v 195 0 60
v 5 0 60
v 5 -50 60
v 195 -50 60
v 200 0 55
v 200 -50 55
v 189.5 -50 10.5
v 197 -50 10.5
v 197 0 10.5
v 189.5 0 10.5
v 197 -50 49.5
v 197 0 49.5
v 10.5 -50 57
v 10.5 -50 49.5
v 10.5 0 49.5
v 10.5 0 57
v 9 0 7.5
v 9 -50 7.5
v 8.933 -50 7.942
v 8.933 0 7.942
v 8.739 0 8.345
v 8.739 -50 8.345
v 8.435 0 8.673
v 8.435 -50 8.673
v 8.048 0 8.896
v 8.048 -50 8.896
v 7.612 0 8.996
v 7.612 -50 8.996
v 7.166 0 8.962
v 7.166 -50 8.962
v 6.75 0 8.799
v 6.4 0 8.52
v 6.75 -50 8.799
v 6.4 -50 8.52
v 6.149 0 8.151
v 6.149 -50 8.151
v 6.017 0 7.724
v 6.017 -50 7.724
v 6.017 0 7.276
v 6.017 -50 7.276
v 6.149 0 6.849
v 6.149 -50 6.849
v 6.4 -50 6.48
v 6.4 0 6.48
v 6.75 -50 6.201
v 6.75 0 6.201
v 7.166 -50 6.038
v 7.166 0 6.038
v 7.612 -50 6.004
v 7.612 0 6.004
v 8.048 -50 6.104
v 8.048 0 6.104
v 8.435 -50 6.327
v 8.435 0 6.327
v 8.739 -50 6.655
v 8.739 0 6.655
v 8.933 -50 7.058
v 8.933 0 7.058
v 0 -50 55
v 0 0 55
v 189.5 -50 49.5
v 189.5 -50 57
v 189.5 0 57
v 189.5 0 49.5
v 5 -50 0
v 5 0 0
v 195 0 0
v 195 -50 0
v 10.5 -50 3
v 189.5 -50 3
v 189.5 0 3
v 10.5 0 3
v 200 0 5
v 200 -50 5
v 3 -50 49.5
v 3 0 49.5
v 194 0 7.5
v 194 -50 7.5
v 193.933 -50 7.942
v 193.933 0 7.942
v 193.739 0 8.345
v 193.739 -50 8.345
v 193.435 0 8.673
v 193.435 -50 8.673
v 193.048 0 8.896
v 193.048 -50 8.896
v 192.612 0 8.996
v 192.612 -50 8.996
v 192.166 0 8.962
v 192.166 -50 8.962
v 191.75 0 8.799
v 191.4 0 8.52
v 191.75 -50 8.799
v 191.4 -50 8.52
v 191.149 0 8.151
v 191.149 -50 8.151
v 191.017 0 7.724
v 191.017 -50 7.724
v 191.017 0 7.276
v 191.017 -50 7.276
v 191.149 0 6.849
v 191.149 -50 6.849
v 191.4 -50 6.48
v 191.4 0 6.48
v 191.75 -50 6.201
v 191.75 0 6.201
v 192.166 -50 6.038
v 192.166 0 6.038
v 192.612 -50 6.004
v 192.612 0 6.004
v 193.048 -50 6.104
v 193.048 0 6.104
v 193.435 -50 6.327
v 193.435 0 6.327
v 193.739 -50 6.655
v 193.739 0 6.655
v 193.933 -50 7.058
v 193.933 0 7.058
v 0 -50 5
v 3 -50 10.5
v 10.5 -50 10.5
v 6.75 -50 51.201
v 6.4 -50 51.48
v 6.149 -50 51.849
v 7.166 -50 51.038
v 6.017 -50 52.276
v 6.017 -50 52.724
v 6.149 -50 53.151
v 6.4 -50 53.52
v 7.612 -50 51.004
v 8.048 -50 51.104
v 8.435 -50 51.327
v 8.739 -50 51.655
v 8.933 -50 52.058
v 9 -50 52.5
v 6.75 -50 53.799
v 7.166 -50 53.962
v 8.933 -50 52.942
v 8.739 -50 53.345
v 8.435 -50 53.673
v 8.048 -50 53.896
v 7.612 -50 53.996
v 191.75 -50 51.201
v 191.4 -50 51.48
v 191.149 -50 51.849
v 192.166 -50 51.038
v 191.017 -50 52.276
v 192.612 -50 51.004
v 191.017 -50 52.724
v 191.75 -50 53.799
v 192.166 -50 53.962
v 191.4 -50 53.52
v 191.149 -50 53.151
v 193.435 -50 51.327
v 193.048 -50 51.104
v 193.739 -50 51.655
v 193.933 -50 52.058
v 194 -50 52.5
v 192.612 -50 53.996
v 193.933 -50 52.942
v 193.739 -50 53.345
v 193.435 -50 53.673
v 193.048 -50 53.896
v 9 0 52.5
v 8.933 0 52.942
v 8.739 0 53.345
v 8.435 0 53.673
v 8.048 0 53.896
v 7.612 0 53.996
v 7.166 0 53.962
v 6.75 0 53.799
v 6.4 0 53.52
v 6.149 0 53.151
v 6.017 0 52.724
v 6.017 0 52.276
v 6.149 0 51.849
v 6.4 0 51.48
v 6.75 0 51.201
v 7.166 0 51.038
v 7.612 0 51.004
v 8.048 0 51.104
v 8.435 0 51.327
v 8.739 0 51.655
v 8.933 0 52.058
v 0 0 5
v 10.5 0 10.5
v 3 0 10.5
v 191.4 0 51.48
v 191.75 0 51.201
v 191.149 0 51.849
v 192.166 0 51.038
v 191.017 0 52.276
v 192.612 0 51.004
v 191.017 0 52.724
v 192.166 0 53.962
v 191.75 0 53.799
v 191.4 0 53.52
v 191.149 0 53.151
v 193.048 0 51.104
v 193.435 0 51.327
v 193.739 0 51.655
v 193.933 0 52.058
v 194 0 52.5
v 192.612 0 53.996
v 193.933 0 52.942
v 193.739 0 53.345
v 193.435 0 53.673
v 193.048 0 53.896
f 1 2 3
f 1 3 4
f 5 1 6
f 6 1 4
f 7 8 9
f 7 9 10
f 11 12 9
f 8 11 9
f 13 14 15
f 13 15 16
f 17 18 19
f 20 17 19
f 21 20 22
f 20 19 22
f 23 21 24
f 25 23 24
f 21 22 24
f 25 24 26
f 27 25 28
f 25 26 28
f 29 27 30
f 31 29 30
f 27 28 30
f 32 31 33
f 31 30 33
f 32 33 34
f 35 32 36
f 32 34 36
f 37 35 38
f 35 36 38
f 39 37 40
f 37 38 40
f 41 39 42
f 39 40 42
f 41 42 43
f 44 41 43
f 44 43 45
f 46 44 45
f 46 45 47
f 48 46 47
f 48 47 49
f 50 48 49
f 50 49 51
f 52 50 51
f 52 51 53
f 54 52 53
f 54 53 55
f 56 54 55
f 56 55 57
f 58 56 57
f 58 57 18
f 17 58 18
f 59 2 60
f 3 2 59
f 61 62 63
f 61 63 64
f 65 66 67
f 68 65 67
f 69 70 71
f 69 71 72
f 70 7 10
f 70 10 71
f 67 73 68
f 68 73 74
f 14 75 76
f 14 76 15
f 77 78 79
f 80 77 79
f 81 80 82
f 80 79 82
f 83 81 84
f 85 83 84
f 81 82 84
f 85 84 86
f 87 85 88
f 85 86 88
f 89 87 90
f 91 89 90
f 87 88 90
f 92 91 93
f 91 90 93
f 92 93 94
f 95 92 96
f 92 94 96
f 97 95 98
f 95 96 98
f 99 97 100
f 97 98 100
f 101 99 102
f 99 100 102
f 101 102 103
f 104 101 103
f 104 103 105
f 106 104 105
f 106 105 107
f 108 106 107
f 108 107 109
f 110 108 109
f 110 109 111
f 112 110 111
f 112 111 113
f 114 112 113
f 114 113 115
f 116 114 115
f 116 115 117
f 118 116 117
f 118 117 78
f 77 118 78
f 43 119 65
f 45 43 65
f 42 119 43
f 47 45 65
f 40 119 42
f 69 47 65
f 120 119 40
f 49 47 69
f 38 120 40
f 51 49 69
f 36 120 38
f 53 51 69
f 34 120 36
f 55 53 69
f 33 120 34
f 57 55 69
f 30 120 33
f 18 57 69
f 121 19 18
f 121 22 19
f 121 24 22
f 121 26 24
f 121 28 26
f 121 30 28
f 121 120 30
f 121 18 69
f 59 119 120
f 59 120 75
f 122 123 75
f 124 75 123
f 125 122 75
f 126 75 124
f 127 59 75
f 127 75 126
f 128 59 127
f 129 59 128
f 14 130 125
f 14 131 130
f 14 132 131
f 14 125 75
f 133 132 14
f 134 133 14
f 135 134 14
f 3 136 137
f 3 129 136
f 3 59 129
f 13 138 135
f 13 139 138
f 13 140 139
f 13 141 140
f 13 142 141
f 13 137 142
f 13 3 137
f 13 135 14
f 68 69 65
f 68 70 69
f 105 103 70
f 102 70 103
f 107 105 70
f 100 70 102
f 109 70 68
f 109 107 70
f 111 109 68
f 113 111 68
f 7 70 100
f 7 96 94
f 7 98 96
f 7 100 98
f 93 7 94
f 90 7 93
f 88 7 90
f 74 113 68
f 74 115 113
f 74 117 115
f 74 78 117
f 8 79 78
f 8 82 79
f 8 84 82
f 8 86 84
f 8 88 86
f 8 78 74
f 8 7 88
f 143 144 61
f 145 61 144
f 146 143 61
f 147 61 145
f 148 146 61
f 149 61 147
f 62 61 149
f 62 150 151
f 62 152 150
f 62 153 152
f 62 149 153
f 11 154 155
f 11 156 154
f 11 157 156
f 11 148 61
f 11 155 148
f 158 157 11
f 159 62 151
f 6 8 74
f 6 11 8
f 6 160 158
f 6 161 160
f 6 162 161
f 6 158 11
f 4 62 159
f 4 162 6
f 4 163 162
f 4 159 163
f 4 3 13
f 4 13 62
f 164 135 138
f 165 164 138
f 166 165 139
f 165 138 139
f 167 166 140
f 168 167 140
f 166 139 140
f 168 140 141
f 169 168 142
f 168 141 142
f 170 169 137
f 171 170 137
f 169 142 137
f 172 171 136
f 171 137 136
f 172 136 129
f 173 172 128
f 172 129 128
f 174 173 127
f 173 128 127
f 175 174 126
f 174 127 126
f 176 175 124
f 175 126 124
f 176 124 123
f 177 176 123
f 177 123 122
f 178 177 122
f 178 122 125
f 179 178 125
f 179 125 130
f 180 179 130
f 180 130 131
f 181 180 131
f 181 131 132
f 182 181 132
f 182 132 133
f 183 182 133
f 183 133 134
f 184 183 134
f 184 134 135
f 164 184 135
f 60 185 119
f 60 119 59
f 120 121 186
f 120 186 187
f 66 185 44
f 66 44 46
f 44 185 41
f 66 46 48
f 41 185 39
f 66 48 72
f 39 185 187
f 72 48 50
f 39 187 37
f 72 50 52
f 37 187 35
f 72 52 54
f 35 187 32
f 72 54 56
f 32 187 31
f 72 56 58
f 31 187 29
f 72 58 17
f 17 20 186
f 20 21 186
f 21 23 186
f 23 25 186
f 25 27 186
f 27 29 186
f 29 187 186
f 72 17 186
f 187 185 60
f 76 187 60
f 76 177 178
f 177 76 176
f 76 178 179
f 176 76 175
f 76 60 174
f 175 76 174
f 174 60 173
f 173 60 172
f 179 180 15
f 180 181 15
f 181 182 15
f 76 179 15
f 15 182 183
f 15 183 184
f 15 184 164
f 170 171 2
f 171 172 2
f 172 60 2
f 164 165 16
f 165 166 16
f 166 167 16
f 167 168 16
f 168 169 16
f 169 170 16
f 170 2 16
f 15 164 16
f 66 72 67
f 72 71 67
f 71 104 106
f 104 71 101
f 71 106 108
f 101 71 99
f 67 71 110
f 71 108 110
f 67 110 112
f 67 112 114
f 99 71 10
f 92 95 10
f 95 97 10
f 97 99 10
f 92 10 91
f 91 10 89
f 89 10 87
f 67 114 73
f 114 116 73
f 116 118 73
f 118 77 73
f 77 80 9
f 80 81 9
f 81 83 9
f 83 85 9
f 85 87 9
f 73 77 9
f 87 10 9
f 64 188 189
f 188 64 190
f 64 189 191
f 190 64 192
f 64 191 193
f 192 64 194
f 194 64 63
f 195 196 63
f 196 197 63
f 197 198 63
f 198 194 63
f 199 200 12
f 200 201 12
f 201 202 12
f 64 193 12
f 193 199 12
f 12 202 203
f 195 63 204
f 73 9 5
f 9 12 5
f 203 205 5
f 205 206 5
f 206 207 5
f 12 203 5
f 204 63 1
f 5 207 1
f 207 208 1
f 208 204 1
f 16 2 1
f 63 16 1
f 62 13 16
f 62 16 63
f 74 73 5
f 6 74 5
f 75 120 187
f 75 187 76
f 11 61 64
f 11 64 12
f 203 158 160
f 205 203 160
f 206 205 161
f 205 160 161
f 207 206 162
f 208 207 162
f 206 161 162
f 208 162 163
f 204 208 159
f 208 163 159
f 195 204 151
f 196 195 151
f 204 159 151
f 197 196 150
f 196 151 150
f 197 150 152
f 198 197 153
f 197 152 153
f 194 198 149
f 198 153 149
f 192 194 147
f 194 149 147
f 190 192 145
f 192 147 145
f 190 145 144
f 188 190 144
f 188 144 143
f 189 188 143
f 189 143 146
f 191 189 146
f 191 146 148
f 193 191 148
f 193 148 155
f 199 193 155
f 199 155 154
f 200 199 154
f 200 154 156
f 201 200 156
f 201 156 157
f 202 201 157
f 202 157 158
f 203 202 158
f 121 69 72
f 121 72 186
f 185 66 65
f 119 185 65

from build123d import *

# Parameters (mm, degrees)
SKETCH_W     = 200
SKETCH_H     = 60
PAD_DEPTH    = 50
CHAMFER_SIZE = 5
SKETCH001_R  = 1.5
POCKET_DEPTH = 50.001


with BuildPart() as part:
    # Sketch → Pad (new body)
    with BuildSketch(Plane.XZ):
        with Locations((100, 30)):
            Rectangle(SKETCH_W, SKETCH_H)
    extrude(amount=PAD_DEPTH)

    # Chamfer
    chamfer_edges = [part.edges().sort_by_distance(p)[0] for p in [
        (200, -25, 0),
        (200, -25, 60),
        (0, -25, 60),
        (0, -25, 0),
    ]]
    chamfer(chamfer_edges, length=CHAMFER_SIZE)

    # Sketch001 (on Face5 of Chamfer) → Pocket (cut, through all)
    with BuildSketch(Plane.XZ.offset(50)):
        with Locations((7.5, 52.5)):
            Circle(SKETCH001_R)
        with Locations((192.5, 52.5)):
            Circle(SKETCH001_R)
        with Locations((192.5, 7.5)):
            Circle(SKETCH001_R)
        with Locations((7.5, 7.5)):
            Circle(SKETCH001_R)
        Polygon((10.5, 57), (189.5, 57), (189.5, 49.5), (197, 49.5), (197, 10.5), (189.5, 10.5), (189.5, 3), (10.5, 3), (10.5, 10.5), (3, 10.5), (3, 49.5), (10.5, 49.5), align=None)
    extrude(amount=-POCKET_DEPTH, mode=Mode.SUBTRACT)


solid = part.part
